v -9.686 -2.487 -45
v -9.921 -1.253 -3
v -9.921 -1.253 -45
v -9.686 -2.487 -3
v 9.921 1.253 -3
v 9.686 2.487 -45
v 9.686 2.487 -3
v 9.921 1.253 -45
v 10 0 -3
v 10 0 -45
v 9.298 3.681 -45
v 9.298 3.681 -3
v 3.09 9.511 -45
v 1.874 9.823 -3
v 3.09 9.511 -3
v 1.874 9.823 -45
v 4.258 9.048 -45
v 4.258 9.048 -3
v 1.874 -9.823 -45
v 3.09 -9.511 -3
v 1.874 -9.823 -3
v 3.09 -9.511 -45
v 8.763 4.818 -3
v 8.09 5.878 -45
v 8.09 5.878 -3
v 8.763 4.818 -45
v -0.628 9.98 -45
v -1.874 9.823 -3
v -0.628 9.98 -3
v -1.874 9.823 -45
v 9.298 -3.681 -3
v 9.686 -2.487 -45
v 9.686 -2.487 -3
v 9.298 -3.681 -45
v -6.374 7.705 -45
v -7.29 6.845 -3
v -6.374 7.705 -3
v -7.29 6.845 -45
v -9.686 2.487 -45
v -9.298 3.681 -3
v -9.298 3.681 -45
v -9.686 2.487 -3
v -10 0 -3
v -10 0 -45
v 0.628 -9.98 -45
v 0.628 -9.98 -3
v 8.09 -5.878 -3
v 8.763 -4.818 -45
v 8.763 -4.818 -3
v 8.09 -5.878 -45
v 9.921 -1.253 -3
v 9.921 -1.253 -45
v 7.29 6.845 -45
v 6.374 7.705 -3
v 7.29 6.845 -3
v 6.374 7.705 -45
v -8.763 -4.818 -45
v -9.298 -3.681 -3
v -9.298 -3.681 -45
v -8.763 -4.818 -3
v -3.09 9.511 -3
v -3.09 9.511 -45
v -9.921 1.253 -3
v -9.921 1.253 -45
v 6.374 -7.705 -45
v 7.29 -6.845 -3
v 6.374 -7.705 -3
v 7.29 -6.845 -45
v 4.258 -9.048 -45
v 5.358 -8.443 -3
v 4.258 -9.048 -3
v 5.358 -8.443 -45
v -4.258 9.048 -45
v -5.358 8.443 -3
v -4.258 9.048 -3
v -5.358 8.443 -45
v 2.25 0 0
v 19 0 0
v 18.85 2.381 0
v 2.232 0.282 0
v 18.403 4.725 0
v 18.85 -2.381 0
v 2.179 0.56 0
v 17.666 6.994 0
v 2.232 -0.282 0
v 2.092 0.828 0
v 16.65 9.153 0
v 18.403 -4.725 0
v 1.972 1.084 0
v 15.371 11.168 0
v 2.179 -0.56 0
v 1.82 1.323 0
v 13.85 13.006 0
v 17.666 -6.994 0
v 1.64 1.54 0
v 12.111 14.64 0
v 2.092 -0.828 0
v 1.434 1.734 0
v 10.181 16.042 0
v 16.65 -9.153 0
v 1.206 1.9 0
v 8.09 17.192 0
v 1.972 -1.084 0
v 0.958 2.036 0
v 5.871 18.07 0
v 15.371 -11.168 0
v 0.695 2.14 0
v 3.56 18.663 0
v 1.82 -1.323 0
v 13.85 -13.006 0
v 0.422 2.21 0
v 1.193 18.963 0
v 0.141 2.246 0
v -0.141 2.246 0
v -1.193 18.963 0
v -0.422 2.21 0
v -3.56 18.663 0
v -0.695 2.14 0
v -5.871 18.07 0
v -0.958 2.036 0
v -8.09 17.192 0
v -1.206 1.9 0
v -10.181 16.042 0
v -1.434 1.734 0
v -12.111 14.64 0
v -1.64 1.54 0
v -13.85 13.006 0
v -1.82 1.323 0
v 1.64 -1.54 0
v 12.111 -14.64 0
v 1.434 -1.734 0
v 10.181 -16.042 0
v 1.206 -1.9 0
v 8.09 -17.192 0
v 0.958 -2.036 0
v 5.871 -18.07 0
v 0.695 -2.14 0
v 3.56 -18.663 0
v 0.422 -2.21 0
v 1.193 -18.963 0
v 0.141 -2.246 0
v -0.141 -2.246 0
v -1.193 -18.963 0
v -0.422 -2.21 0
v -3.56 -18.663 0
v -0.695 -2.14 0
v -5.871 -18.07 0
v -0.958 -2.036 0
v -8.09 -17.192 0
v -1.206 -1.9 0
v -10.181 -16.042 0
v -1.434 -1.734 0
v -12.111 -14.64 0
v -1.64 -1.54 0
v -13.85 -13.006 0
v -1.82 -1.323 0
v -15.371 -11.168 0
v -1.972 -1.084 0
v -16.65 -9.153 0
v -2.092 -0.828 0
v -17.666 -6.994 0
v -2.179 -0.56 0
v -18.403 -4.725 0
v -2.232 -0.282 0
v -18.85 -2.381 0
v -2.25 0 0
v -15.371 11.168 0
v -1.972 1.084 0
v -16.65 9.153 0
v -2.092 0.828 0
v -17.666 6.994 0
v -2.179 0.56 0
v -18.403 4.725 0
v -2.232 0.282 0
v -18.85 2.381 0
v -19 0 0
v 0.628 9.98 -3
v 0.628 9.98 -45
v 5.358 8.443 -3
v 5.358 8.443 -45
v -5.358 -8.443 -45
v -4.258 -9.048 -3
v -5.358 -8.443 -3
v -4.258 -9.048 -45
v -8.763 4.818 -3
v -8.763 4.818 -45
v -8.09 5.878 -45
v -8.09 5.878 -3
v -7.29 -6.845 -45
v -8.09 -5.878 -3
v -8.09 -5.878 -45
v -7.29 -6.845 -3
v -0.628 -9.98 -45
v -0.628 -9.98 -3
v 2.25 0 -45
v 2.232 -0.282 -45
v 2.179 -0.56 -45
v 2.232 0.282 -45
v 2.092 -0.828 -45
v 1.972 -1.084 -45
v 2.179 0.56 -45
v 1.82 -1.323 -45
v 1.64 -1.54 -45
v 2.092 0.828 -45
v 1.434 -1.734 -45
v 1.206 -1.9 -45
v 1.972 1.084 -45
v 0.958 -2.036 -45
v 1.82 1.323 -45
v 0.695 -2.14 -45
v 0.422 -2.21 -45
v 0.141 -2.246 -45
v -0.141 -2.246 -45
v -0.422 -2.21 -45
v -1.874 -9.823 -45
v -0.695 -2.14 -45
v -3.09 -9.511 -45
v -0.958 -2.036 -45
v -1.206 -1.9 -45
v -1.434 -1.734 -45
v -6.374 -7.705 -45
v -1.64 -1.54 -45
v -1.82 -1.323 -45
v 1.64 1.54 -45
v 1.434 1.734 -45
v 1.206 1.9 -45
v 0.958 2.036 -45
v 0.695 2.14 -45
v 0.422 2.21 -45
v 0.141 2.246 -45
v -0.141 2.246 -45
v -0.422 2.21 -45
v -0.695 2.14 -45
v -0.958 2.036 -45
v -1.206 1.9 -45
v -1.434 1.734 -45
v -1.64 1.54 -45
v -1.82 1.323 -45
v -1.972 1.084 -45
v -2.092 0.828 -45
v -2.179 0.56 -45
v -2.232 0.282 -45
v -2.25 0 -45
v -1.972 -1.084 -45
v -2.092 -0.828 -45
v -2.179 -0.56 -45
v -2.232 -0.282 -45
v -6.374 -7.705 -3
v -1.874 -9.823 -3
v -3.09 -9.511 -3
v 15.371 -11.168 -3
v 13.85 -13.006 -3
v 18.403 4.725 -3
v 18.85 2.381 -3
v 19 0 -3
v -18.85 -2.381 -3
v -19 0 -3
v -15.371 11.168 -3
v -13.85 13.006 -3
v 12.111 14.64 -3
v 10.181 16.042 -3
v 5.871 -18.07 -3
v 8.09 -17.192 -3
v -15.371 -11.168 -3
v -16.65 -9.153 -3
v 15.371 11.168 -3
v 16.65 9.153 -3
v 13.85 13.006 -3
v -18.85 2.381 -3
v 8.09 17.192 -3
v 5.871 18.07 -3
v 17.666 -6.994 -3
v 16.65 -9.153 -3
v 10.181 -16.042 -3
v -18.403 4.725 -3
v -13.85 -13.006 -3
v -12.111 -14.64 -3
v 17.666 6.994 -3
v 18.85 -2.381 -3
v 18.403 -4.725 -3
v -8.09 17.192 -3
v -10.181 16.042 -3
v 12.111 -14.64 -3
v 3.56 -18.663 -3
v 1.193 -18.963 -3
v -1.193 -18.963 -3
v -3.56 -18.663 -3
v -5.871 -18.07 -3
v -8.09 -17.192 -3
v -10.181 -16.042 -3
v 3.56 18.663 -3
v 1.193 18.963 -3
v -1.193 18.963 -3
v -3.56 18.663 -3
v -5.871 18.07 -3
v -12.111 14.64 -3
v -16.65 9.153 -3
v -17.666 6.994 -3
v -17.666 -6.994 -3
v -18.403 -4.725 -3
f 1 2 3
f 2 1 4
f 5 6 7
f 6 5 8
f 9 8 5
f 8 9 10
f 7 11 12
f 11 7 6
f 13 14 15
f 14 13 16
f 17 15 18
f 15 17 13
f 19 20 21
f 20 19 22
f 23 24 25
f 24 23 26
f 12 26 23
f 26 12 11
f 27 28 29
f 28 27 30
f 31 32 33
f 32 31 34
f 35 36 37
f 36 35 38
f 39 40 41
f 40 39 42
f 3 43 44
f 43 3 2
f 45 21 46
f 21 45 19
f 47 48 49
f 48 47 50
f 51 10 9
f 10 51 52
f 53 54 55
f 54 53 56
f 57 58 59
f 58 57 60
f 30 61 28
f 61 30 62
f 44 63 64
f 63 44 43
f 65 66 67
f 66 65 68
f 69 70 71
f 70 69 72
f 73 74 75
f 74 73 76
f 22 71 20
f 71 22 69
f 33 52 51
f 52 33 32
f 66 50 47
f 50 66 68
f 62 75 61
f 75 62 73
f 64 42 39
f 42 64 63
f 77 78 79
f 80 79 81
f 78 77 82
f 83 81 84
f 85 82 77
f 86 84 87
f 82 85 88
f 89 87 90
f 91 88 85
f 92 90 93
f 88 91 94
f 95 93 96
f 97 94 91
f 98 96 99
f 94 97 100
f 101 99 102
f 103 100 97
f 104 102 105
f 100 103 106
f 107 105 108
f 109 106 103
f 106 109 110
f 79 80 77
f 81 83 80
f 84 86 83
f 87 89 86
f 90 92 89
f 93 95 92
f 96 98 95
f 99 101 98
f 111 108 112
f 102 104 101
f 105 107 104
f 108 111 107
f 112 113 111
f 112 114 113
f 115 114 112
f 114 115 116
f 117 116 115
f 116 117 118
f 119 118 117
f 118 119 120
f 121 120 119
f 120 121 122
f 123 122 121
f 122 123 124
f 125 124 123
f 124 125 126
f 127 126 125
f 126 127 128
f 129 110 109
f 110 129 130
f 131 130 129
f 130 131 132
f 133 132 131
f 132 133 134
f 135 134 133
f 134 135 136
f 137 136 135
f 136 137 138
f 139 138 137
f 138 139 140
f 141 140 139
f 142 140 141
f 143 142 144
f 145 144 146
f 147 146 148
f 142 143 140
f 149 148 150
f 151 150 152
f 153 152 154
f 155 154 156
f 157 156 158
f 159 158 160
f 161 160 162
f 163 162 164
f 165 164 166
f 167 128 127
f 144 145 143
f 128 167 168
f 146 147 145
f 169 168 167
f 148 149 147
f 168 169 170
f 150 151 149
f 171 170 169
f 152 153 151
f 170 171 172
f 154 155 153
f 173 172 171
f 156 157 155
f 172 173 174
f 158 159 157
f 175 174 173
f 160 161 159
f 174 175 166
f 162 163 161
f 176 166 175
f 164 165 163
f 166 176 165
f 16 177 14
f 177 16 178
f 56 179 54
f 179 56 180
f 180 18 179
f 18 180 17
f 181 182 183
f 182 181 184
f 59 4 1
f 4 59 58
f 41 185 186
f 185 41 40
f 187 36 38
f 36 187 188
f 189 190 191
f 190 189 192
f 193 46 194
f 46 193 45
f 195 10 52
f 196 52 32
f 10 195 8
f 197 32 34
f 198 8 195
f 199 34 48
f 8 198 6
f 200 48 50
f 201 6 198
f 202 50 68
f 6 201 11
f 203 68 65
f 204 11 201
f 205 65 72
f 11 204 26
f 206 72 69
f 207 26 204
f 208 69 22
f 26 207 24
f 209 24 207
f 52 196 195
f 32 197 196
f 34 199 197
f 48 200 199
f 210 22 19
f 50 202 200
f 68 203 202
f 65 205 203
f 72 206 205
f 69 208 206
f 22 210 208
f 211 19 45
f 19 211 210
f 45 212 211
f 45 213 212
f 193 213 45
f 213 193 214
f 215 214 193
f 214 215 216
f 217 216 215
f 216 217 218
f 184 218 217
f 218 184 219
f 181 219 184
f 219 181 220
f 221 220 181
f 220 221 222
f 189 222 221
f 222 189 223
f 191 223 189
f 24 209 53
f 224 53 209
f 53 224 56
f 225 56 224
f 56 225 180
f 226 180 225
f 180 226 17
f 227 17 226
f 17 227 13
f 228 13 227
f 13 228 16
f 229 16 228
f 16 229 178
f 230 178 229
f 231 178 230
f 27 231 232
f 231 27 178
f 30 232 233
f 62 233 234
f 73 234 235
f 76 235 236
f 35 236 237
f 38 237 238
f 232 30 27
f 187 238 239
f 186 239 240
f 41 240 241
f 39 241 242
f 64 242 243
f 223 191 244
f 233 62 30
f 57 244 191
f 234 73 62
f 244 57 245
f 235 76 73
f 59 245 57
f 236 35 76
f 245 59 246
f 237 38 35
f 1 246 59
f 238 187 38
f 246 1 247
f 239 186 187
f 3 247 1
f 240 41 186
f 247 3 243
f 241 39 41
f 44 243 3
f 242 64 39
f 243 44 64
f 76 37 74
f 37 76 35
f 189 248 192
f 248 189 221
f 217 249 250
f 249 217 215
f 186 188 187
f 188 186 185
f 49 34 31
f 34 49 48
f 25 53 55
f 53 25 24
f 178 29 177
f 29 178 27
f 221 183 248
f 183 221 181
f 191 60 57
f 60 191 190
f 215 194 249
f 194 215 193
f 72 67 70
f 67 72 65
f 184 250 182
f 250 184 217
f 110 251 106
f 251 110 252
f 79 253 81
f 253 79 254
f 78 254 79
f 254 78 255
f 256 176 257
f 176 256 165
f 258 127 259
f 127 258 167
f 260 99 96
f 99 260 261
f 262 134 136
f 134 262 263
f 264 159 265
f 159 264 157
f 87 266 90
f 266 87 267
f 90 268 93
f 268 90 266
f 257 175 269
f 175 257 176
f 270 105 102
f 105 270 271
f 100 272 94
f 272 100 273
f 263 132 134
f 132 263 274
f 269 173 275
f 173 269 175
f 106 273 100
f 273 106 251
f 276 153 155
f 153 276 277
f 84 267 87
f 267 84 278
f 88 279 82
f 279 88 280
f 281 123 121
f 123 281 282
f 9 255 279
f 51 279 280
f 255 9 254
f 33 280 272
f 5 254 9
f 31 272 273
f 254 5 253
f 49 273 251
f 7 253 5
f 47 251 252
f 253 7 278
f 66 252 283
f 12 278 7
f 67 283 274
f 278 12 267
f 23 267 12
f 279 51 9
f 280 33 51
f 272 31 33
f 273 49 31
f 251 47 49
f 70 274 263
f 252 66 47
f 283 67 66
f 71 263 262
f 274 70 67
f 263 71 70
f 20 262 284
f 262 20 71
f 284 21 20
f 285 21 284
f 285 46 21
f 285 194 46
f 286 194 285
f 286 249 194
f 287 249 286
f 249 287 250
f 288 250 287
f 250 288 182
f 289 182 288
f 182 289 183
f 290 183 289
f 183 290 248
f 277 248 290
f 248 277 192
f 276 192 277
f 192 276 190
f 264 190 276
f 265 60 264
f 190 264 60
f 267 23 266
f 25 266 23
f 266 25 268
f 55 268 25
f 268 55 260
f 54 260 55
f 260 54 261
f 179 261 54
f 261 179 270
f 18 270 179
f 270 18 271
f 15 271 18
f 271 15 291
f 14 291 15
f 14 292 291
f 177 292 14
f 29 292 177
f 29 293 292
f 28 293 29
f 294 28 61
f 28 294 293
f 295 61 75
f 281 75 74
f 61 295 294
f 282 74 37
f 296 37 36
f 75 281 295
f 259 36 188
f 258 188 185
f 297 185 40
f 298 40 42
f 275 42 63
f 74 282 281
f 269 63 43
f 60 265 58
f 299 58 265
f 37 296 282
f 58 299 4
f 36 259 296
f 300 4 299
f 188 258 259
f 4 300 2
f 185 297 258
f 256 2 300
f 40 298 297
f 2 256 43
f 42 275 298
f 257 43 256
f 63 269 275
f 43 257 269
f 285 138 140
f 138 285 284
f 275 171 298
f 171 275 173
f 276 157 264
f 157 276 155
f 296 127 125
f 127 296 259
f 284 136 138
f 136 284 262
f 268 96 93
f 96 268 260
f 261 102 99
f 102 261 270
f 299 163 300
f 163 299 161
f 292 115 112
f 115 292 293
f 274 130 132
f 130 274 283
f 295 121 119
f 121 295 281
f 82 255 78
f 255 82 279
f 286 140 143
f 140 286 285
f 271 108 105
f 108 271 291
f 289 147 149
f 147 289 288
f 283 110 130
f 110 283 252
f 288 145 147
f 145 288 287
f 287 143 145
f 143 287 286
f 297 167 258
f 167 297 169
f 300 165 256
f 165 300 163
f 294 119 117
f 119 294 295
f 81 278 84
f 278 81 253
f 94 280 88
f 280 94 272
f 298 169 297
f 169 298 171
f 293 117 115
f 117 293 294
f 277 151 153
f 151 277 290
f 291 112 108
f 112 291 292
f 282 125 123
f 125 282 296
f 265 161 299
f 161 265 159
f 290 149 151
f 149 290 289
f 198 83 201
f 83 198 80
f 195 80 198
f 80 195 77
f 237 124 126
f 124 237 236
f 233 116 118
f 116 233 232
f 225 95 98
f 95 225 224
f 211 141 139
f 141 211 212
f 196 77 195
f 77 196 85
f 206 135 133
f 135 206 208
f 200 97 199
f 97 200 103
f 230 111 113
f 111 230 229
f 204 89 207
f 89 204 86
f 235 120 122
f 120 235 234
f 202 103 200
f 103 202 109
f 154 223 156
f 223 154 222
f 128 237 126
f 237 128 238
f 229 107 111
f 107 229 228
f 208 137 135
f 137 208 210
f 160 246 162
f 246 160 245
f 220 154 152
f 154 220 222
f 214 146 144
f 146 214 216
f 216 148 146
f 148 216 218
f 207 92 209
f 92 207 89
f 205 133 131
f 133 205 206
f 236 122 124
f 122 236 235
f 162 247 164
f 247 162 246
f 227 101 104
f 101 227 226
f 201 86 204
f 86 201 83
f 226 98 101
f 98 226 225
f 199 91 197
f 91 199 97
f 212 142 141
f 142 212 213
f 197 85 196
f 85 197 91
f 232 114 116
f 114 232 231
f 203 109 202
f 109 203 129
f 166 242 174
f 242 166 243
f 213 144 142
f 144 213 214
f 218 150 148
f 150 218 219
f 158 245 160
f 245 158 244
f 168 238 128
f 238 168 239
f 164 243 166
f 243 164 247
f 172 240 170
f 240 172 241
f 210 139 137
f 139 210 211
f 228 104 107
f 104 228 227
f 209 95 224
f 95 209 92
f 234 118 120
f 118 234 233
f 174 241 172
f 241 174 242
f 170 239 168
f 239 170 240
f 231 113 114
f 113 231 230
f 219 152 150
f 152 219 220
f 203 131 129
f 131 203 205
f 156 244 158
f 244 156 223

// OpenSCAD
$fn = 50;


difference() {
	union() {
		translate(v = [0, 0, -45.0000000000]) {
			cylinder(h = 45, r = 10.0000000000);
		}
		translate(v = [0, 0, -3.0000000000]) {
			cylinder(h = 3, r = 19.0000000000);
		}
	}
	union() {
		#translate(v = [0, 0, -45]) {
			cylinder(h = 45, r = 2.2500000000);
		}
	}
}
